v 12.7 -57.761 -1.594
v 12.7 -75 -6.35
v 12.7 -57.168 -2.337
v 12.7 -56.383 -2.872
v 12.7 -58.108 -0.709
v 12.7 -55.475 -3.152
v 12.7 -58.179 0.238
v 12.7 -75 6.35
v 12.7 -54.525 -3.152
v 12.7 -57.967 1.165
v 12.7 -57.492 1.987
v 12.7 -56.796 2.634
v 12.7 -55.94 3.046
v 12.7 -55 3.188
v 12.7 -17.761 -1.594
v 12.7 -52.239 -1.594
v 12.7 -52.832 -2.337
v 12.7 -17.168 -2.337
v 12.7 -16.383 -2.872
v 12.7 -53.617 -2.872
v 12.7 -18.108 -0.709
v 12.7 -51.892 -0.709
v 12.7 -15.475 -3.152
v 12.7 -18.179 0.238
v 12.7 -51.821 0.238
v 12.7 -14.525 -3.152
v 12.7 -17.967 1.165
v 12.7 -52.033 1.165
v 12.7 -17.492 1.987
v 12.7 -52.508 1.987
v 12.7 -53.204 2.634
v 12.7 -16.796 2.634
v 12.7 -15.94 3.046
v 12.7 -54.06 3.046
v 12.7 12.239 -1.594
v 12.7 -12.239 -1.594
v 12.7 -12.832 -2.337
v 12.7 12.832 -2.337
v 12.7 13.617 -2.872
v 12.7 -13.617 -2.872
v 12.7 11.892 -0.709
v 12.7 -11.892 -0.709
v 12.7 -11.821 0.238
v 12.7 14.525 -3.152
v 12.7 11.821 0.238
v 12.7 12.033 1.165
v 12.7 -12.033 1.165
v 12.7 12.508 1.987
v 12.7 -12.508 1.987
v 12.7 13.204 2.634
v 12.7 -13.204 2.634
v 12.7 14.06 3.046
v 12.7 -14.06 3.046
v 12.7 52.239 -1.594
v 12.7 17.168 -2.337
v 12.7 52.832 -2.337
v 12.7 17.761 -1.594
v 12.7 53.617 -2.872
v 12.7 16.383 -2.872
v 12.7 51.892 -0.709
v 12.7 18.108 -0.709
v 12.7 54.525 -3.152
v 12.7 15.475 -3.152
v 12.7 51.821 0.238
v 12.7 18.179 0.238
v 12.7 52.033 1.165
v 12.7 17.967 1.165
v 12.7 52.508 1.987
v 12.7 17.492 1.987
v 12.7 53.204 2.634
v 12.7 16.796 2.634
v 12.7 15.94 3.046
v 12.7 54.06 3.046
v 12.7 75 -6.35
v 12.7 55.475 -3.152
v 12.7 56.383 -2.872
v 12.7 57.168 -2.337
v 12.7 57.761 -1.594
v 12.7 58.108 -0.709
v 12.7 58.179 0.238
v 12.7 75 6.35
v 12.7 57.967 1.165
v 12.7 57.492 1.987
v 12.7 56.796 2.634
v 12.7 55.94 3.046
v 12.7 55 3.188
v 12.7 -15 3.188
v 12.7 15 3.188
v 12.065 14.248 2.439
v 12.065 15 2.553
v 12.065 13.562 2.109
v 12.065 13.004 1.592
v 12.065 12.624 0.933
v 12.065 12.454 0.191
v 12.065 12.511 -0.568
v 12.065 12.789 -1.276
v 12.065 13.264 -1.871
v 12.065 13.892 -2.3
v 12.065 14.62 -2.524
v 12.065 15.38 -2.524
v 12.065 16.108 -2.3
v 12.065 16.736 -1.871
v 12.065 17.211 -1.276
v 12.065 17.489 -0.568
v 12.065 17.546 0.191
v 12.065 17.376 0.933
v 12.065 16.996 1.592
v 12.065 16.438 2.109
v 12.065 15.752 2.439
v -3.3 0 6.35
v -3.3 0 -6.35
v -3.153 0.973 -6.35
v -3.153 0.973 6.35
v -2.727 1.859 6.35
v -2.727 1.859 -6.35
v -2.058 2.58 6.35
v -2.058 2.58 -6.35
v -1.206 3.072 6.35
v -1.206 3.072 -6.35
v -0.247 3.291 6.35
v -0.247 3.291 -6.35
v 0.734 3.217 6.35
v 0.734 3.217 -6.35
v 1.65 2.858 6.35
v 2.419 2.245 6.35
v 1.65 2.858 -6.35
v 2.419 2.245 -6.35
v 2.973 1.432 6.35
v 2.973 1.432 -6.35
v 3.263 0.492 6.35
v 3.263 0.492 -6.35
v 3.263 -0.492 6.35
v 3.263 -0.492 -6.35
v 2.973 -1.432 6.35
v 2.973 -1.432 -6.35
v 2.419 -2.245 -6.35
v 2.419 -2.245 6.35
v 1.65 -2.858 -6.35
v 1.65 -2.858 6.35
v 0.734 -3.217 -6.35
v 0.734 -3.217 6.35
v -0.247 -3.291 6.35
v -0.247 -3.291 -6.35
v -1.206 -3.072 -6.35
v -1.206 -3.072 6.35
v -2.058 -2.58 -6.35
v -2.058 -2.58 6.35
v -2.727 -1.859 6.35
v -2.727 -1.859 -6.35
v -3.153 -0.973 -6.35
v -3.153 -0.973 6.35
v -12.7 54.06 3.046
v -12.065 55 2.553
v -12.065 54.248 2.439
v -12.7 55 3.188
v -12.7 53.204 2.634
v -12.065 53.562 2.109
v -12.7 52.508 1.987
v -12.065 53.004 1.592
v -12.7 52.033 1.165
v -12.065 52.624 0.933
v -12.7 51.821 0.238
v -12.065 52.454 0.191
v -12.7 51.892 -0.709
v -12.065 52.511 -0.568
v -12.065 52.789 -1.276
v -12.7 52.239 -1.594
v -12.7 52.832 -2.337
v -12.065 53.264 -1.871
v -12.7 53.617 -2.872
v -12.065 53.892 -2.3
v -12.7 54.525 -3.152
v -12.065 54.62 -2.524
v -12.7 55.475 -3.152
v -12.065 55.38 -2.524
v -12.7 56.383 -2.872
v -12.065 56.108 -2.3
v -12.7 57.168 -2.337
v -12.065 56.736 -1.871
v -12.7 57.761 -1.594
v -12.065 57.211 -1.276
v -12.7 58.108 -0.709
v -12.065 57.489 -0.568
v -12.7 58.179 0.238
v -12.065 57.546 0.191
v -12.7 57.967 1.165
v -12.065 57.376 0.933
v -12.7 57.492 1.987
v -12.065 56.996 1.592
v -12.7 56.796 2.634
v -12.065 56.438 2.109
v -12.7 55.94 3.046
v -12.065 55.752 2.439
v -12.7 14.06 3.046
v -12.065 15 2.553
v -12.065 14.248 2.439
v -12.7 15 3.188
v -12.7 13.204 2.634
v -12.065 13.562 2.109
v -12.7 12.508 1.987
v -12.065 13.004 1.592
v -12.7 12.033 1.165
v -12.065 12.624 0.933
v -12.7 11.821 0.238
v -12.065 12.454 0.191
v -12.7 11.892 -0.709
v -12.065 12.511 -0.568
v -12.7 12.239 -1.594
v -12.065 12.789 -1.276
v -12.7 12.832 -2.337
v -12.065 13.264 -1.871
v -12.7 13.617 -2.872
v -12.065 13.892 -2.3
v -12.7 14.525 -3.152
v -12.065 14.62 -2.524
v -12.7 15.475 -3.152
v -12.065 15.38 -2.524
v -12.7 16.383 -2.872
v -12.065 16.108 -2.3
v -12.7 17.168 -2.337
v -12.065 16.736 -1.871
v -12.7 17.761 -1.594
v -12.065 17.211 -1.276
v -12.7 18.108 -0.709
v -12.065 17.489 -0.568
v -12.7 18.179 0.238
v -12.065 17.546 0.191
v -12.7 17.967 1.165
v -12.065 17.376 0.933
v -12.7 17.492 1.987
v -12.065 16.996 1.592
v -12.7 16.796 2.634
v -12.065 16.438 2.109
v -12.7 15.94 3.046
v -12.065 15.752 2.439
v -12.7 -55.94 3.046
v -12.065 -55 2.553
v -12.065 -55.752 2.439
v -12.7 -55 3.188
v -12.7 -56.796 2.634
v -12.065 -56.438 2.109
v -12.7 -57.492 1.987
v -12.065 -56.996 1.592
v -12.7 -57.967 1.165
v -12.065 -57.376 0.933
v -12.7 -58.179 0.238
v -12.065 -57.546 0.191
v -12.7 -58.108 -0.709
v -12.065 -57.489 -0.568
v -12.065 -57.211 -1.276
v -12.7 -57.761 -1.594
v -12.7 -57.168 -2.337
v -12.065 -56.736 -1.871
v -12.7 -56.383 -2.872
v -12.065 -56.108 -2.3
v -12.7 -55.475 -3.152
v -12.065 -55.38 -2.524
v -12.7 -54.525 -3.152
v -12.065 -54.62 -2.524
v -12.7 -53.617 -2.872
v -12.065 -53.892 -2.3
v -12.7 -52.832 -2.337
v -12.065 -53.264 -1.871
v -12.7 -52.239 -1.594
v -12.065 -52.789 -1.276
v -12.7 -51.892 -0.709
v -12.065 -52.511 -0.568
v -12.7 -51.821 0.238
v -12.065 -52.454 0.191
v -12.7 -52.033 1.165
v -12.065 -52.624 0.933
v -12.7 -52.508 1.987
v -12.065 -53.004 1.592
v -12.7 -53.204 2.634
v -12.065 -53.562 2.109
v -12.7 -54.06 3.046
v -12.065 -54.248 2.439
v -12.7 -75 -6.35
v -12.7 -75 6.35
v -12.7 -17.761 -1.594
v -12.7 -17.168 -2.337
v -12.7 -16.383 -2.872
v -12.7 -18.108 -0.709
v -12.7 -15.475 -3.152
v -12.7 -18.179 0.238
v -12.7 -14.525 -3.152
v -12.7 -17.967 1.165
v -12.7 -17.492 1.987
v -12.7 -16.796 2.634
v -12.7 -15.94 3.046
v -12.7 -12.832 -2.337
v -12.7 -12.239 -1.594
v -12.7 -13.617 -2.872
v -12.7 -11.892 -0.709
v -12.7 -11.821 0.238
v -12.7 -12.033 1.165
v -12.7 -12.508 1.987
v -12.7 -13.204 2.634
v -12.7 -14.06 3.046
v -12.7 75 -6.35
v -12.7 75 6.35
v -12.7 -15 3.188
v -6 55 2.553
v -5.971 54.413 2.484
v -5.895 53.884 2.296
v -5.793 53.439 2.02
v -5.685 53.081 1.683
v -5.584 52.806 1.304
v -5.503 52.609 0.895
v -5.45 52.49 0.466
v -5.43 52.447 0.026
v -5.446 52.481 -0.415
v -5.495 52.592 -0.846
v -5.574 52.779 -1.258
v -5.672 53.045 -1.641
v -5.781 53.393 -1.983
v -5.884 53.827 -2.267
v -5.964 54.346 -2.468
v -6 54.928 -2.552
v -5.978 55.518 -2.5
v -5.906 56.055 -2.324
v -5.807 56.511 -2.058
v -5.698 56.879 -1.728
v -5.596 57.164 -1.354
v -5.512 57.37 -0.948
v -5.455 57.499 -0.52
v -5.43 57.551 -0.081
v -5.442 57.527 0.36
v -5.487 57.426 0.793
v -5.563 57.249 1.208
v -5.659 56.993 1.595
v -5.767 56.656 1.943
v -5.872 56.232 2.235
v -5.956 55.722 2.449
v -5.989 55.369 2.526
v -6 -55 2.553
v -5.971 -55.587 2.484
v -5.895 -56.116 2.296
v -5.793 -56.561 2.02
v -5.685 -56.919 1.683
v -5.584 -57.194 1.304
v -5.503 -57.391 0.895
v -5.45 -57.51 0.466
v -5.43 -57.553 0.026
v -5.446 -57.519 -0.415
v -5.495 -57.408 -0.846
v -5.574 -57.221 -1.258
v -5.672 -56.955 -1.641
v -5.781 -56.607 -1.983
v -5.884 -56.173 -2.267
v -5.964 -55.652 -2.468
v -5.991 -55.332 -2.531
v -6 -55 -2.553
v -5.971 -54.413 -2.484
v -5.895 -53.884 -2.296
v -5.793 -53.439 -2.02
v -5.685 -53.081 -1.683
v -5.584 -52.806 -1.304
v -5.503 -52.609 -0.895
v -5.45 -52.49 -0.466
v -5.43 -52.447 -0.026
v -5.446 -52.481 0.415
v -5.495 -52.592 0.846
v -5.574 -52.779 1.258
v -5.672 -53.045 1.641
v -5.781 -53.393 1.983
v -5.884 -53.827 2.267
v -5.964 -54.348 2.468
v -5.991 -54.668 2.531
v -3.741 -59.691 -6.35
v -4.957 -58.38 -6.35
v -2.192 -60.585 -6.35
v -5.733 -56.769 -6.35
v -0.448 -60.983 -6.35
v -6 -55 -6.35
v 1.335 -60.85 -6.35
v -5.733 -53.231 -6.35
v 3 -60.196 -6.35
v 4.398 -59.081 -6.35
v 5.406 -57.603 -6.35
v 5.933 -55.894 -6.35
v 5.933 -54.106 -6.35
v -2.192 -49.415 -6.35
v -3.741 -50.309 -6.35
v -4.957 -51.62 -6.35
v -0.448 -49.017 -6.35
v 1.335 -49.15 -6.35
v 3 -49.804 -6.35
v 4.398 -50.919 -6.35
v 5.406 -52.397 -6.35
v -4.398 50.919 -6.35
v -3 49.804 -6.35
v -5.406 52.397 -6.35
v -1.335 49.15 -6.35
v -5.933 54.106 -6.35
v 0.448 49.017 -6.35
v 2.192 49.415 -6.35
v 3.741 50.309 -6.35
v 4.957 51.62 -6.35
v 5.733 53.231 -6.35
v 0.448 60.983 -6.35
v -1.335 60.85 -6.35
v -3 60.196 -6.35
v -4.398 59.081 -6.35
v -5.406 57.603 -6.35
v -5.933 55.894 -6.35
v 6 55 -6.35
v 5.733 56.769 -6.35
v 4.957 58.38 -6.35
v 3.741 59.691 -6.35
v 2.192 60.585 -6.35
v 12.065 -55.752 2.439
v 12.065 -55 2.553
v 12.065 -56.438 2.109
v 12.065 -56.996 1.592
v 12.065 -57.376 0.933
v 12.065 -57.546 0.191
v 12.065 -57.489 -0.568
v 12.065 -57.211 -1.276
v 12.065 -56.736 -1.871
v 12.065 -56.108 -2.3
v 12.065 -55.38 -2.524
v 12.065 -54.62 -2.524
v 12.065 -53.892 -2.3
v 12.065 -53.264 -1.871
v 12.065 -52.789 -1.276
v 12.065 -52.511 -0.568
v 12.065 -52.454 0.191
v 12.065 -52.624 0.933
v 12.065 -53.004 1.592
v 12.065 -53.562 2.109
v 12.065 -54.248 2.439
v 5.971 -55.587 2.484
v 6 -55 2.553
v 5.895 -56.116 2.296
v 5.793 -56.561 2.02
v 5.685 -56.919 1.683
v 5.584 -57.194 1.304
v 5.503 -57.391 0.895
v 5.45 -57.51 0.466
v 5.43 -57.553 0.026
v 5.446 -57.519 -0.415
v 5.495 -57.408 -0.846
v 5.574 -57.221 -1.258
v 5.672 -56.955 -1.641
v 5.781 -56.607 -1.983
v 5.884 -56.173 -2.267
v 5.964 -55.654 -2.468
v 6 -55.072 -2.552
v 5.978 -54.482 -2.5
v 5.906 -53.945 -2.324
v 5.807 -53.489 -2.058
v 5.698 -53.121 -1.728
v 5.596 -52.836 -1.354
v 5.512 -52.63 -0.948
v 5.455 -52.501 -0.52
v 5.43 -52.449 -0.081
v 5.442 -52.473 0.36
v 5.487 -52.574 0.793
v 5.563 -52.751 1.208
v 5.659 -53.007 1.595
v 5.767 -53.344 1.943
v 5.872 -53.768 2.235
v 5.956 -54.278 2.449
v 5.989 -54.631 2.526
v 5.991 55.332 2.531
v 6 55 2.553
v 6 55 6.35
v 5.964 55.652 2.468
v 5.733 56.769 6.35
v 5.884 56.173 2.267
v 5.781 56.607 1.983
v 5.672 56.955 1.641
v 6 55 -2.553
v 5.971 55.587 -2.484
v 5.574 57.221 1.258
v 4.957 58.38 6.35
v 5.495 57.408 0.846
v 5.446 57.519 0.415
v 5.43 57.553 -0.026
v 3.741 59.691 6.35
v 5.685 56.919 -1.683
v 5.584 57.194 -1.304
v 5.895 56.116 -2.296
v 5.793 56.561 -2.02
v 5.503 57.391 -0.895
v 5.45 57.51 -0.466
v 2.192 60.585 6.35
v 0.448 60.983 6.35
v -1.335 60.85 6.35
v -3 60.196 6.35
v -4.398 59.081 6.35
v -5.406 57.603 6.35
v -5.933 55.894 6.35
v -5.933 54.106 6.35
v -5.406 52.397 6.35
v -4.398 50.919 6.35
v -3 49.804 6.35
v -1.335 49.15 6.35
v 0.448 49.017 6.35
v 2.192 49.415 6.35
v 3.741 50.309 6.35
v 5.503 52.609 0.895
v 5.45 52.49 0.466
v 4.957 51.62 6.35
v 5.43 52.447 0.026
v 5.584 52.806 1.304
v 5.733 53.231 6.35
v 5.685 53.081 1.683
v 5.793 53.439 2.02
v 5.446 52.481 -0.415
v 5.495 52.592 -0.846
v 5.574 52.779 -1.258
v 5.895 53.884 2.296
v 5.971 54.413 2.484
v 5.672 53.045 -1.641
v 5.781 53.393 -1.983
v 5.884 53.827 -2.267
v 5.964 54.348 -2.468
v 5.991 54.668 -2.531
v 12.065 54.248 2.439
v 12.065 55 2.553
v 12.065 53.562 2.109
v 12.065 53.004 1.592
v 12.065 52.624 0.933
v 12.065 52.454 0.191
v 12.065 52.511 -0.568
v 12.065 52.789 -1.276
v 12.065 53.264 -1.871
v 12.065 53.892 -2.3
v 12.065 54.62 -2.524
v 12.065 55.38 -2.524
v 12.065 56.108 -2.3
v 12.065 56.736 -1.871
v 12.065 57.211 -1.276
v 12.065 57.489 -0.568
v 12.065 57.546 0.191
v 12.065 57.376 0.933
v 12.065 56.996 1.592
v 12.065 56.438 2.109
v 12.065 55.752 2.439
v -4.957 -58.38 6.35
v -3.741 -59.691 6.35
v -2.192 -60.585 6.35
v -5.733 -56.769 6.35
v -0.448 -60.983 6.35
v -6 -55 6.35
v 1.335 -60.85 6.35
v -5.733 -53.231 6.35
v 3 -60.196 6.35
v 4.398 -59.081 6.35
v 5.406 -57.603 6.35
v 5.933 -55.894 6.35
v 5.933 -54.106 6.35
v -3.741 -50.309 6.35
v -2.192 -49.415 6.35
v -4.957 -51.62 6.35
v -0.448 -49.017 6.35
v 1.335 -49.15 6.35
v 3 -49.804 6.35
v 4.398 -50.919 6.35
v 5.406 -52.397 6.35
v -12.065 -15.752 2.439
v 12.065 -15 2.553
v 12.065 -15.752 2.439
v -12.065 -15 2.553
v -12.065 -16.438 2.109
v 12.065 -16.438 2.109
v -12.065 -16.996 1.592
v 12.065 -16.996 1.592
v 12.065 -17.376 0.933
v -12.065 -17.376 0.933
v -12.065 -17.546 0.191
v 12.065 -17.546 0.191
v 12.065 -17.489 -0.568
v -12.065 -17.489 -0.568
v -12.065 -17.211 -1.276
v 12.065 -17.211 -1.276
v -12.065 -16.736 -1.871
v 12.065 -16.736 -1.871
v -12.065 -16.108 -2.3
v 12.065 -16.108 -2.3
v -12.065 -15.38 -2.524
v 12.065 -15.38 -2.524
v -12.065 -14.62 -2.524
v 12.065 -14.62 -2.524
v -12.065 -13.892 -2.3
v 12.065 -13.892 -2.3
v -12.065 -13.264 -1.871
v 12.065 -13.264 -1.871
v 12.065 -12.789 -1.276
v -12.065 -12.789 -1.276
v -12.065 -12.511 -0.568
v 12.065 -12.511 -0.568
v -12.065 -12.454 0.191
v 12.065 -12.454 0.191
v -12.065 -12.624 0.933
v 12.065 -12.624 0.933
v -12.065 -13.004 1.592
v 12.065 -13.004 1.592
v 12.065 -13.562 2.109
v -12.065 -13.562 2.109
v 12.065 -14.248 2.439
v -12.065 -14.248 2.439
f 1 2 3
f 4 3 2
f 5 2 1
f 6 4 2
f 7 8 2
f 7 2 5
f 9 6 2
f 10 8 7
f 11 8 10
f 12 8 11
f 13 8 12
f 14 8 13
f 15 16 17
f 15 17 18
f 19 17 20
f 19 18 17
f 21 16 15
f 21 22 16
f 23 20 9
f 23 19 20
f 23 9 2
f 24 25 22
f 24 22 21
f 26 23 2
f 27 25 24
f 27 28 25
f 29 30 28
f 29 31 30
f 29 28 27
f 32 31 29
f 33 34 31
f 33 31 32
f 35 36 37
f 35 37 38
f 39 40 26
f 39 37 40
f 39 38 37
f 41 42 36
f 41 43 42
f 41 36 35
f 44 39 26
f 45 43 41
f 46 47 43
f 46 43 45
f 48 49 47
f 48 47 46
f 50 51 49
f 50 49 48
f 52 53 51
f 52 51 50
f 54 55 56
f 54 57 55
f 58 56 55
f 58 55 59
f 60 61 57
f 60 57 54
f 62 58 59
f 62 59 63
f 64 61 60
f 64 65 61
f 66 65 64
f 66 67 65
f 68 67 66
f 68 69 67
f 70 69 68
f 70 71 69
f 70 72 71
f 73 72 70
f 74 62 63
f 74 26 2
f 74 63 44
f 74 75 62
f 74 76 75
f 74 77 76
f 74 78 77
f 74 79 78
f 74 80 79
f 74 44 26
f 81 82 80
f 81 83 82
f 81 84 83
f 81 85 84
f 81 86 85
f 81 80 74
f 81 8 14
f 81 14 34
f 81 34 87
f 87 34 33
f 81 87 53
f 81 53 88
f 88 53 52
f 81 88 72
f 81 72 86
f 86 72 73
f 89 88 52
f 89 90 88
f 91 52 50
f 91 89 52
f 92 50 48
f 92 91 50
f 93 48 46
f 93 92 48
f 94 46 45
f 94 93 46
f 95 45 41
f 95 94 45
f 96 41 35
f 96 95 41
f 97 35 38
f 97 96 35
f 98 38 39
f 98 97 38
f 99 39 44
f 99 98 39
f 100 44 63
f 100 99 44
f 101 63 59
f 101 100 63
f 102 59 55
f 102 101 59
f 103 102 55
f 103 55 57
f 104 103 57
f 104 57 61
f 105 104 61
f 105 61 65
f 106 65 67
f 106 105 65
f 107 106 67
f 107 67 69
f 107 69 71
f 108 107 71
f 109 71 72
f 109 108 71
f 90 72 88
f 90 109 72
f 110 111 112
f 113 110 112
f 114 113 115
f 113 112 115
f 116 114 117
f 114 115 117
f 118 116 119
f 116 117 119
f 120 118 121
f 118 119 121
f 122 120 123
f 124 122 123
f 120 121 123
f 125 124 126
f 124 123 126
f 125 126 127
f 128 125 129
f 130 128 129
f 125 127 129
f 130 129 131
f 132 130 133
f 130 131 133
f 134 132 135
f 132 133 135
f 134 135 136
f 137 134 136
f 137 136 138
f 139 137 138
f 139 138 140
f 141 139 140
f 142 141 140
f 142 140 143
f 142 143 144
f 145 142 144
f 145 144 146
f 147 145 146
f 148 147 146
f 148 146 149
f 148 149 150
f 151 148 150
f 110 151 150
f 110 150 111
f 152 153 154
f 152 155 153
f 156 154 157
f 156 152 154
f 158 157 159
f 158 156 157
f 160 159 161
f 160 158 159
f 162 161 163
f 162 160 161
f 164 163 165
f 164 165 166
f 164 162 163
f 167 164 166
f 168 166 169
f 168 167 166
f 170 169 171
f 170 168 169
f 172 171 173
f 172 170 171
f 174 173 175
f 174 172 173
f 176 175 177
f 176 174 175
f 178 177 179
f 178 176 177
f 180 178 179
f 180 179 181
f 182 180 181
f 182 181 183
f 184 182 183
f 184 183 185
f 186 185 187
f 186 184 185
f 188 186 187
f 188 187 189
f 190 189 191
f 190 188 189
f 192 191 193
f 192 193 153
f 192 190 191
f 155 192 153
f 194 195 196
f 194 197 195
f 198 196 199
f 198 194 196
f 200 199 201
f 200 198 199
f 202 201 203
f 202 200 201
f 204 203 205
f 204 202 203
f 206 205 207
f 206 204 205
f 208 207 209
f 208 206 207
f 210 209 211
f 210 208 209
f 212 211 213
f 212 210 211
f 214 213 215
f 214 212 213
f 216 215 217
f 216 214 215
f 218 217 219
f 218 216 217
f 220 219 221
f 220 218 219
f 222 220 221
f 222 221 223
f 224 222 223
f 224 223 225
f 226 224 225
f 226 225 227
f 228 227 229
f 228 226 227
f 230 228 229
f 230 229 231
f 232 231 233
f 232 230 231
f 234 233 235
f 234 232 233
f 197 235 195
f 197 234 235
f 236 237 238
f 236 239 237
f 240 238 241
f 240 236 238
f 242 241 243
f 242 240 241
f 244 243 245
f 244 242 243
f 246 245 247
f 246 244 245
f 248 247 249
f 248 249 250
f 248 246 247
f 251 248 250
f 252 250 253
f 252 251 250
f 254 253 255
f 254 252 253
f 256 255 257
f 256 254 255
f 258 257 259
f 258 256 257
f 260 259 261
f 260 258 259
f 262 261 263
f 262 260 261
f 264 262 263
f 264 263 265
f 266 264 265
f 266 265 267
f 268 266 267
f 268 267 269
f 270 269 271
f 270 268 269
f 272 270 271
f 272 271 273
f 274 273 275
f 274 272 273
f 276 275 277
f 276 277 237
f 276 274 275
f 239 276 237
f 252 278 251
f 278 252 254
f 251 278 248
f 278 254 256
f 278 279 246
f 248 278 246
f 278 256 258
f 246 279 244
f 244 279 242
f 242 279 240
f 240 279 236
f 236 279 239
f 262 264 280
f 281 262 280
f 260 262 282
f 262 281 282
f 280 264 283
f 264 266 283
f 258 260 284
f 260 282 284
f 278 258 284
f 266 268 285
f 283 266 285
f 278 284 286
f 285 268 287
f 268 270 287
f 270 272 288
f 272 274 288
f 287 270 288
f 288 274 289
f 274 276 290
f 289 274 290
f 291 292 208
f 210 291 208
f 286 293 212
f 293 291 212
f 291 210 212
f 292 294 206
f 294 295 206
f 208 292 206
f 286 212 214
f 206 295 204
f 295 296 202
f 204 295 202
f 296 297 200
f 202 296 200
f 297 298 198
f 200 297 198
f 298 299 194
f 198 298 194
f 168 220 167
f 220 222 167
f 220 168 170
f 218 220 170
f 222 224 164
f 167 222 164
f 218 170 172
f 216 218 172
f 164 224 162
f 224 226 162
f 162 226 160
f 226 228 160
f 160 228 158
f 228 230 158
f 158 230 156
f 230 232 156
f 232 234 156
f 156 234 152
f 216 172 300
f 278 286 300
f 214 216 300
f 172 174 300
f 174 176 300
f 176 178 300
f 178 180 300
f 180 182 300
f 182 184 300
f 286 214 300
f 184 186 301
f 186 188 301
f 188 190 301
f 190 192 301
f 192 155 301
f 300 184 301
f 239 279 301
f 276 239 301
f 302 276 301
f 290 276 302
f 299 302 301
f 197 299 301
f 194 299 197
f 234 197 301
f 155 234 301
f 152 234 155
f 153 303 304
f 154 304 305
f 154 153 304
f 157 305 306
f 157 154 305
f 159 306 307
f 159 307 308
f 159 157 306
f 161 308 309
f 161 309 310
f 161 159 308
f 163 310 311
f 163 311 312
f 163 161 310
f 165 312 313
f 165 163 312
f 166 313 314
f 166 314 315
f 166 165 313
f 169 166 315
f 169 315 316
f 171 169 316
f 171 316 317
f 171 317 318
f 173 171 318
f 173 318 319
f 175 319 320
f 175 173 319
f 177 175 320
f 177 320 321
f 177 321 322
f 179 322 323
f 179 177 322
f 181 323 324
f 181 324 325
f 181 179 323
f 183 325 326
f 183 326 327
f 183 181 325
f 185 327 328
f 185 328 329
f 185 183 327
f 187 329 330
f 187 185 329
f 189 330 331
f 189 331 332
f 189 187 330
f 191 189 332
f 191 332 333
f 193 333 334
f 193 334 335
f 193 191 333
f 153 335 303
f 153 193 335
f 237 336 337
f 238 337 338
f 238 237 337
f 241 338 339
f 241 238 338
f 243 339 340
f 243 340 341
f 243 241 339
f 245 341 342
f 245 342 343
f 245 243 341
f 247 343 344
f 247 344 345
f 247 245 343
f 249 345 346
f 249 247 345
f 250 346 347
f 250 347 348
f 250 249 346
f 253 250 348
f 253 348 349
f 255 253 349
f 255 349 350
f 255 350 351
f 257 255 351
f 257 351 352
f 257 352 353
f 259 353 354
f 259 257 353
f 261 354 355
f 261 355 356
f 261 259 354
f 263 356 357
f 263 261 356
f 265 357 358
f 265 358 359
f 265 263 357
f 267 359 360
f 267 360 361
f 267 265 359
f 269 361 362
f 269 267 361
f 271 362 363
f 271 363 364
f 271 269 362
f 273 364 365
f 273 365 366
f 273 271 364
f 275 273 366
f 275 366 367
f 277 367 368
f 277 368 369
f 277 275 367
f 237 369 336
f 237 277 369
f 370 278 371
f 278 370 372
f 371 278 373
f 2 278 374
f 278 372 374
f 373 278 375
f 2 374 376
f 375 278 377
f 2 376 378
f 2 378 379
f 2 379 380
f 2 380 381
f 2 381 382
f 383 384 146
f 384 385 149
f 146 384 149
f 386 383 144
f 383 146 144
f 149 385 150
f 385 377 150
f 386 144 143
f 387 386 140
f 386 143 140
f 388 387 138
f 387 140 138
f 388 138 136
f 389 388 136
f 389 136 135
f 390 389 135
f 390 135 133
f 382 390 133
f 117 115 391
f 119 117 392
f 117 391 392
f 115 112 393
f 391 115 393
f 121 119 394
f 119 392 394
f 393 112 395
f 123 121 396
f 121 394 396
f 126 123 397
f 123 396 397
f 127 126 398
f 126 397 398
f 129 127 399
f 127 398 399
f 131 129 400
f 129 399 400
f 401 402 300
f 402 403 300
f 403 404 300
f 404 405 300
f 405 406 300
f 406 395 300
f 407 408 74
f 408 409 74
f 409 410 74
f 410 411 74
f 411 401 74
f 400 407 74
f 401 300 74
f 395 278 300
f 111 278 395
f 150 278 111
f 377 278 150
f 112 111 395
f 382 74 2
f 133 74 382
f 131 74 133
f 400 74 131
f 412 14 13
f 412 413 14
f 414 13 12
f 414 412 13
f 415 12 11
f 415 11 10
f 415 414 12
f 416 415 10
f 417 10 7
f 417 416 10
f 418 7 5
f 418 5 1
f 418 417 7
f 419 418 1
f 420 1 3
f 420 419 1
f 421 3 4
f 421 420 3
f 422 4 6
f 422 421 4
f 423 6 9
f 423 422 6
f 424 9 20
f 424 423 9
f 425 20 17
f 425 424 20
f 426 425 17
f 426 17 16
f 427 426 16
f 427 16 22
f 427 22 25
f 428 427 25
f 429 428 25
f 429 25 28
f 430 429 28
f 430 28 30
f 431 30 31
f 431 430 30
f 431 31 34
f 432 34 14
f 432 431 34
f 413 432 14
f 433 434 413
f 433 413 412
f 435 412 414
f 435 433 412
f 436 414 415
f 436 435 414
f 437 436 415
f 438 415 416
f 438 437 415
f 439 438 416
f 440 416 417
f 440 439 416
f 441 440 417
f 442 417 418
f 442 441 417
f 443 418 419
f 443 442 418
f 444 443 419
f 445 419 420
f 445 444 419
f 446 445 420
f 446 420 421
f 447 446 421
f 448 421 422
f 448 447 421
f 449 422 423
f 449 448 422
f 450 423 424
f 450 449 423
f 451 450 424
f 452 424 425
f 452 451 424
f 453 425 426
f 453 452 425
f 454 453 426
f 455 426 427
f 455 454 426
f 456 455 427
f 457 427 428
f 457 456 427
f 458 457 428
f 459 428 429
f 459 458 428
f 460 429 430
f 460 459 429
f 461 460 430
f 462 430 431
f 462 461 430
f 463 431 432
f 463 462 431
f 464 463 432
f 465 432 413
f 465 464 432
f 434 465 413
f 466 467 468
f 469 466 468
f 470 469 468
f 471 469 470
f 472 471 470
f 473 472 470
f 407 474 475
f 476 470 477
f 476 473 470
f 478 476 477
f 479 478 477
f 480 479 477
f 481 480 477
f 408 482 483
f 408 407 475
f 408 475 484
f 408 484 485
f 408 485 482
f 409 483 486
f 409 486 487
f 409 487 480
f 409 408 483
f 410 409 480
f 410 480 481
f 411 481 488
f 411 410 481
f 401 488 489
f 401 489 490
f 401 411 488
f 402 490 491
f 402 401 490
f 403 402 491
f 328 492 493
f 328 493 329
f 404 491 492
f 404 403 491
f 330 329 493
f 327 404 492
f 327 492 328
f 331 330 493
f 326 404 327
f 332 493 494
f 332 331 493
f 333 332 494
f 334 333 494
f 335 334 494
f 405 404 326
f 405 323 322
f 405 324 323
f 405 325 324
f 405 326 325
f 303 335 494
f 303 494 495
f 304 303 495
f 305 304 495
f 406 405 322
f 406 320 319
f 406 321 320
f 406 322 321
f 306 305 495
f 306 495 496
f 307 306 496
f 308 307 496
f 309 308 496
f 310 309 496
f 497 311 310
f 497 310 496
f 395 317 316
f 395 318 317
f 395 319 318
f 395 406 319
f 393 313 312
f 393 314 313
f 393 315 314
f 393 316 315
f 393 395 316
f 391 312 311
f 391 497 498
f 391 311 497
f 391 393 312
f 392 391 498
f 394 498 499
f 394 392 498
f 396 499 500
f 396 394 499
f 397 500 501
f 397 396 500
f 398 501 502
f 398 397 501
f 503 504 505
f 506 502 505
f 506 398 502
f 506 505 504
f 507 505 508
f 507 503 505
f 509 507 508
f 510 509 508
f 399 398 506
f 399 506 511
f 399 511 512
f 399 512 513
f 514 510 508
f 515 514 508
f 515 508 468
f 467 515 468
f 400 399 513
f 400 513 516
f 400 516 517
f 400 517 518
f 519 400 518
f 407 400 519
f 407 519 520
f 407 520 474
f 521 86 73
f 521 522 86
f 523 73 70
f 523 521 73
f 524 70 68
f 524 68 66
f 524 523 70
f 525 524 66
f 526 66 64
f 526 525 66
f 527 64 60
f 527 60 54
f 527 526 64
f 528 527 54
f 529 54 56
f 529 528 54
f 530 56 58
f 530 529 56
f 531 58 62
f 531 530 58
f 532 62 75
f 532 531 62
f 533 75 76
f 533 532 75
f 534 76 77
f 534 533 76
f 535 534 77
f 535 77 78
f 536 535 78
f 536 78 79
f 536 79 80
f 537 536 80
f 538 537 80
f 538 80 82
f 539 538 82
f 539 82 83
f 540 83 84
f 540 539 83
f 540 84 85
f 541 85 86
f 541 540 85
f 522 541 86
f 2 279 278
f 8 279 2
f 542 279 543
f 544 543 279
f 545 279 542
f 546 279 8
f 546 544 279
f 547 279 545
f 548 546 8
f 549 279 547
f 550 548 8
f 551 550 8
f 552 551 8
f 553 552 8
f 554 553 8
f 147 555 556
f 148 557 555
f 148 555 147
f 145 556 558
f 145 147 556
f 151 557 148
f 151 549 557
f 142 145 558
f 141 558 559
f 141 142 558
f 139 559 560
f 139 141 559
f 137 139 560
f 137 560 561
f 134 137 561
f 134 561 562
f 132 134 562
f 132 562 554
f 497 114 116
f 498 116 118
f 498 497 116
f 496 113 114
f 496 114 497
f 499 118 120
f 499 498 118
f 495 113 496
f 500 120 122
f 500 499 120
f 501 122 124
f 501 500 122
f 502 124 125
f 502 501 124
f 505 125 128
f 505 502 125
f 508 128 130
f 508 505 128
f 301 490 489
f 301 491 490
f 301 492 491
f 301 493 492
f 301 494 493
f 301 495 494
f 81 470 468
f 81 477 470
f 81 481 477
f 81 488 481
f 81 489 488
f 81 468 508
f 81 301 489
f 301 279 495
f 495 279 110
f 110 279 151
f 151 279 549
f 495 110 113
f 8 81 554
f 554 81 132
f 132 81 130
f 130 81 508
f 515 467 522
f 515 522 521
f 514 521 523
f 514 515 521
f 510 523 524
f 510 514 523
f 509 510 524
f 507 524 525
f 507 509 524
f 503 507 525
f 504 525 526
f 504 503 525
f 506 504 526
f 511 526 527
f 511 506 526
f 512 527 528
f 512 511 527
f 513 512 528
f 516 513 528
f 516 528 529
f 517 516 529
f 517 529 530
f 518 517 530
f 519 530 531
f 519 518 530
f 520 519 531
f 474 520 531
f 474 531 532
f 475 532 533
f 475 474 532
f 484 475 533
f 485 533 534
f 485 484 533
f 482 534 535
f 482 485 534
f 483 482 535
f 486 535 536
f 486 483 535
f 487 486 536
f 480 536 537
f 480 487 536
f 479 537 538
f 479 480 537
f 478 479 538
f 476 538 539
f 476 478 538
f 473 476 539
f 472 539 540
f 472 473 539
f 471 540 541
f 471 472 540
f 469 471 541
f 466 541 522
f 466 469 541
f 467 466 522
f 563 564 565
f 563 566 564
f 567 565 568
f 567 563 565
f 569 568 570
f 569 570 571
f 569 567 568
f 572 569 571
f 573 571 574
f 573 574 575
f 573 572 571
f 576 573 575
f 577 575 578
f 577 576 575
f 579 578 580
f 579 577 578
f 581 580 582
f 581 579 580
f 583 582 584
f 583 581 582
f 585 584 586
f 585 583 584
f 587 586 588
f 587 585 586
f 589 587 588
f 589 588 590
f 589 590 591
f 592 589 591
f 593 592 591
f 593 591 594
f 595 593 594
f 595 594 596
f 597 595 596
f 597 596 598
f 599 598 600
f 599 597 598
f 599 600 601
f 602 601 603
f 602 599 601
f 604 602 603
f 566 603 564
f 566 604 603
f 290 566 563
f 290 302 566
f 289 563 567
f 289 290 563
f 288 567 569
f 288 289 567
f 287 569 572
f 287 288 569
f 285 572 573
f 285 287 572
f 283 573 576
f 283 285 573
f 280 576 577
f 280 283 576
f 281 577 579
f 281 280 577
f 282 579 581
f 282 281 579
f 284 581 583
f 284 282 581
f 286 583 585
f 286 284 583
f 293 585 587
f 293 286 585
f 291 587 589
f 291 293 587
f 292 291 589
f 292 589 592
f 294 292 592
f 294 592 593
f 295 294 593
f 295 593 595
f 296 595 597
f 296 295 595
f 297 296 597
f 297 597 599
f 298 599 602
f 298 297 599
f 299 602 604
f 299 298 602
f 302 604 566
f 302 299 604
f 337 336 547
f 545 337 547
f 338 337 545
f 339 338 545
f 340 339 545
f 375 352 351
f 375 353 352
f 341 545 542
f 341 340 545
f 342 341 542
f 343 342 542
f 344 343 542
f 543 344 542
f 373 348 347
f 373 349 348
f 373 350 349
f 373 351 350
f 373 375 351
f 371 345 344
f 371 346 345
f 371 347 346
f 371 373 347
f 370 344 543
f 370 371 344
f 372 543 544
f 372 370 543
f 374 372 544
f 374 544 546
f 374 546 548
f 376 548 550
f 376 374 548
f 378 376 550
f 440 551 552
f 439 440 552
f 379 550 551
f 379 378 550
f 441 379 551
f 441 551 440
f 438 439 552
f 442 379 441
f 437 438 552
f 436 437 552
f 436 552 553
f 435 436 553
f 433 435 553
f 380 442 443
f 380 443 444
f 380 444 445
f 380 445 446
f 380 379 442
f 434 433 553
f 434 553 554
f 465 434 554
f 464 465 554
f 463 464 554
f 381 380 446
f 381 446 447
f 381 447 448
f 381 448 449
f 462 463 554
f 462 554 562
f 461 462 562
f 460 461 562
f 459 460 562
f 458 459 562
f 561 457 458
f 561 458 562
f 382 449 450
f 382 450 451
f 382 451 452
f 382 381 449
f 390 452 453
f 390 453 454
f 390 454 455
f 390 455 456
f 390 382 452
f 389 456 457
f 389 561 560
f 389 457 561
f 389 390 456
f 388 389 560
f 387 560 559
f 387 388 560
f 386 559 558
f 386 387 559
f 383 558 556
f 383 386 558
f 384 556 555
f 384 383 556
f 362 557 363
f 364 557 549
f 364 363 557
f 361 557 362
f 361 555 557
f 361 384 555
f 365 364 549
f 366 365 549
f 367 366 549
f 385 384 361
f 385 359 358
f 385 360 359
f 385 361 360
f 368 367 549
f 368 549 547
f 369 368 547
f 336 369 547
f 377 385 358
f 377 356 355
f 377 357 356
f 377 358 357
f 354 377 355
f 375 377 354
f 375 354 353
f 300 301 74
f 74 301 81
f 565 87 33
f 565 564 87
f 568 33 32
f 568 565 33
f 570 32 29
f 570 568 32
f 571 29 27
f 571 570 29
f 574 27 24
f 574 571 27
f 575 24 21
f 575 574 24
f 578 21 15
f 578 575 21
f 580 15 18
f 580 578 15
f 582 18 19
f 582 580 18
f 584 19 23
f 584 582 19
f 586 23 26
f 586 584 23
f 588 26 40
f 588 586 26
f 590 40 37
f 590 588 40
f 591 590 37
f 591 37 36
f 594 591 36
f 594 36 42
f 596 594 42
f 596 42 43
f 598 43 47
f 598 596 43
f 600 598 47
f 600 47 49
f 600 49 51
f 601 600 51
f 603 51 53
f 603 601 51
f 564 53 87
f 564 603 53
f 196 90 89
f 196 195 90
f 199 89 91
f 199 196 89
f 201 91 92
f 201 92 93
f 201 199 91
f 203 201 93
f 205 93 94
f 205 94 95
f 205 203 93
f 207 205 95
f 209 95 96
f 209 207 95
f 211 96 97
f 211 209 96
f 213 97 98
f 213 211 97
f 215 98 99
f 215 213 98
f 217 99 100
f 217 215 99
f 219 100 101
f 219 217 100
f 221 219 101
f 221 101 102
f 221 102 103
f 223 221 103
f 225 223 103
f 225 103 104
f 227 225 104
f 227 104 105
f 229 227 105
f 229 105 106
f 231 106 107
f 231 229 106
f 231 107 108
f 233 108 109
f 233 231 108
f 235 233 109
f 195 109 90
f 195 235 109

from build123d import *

# Parameters (mm, degrees)
CROQUIS1_W                         = 25.4
CROQUIS1_H                         = 150
CROQUIS1_R                         = 6
SALIENTE_EXTRUIR1_DEPTH            = 6.35
TALADRO_ROSCADO_1_4_201_AT_2_COUNT = 2
TALADRO_ROSCADO_1_4_201_AT_2_PITCH = 30
TALADRO_ROSCADO_1_4_202_AT_2_COUNT = 2
TALADRO_ROSCADO_1_4_202_AT_2_PITCH = 110
TALADRO_DE_MARGEN_PARA_1_D         = 6.6


with BuildPart() as part:
    # Croquis1 → Saliente-Extruir1 (new, symmetric)
    with BuildSketch(Plane.XY):
        Rectangle(CROQUIS1_W, CROQUIS1_H)
        with Locations((0, 55)):
            Circle(CROQUIS1_R, mode=Mode.SUBTRACT)
        with Locations(Location((0, -55, 0), (0, 0, 180))):
            Circle(CROQUIS1_R, mode=Mode.SUBTRACT)
    extrude(amount=SALIENTE_EXTRUIR1_DEPTH, both=True)

    # Croquis3 → Taladro roscado 1/4-201 (revolve, cut)
    with BuildSketch(Plane(origin=(-12.7, -15, 0), x_dir=(0, 0, 1), z_dir=(0, 1, 0))):
        Polygon((0, 0), (0, 25.4), (3.1877, 25.4), (2.5527, 24.765), (2.5527, 0.635), (3.1877, 0), align=None)
    taladro_roscado_1_4_201 = revolve(axis=Axis((-19.05, -15, 0), (1, 0, 0)), mode=Mode.SUBTRACT)

    # Taladro roscado 1/4-201 at 2: Taladro roscado 1/4-201 ×2
    with Locations(*[(0, i * TALADRO_ROSCADO_1_4_201_AT_2_PITCH, 0) for i in range(1, TALADRO_ROSCADO_1_4_201_AT_2_COUNT)]):
        add(taladro_roscado_1_4_201, mode=Mode.SUBTRACT)

    # Croquis7 → Taladro roscado 1/4-202 (revolve, cut)
    with BuildSketch(Plane(origin=(-12.7, 55, 0), x_dir=(0, 0, 1), z_dir=(0, 1, 0))):
        Polygon((0, 0), (0, 25.4), (3.1877, 25.4), (2.5527, 24.765), (2.5527, 0.635), (3.1877, 0), align=None)
    taladro_roscado_1_4_202 = revolve(axis=Axis((-19.05, 55, 0), (1, 0, 0)), mode=Mode.SUBTRACT)

    # Taladro roscado 1/4-202 at 2: Taladro roscado 1/4-202 ×2
    with Locations(*[(0, -i * TALADRO_ROSCADO_1_4_202_AT_2_PITCH, 0) for i in range(1, TALADRO_ROSCADO_1_4_202_AT_2_COUNT)]):
        add(taladro_roscado_1_4_202, mode=Mode.SUBTRACT)

    # Taladro de margen para 1 (through all)
    with Locations(Plane.XY.offset(6.35)):
        with Locations((0, 0)):
            Hole(TALADRO_DE_MARGEN_PARA_1_D / 2)


solid = part.part
